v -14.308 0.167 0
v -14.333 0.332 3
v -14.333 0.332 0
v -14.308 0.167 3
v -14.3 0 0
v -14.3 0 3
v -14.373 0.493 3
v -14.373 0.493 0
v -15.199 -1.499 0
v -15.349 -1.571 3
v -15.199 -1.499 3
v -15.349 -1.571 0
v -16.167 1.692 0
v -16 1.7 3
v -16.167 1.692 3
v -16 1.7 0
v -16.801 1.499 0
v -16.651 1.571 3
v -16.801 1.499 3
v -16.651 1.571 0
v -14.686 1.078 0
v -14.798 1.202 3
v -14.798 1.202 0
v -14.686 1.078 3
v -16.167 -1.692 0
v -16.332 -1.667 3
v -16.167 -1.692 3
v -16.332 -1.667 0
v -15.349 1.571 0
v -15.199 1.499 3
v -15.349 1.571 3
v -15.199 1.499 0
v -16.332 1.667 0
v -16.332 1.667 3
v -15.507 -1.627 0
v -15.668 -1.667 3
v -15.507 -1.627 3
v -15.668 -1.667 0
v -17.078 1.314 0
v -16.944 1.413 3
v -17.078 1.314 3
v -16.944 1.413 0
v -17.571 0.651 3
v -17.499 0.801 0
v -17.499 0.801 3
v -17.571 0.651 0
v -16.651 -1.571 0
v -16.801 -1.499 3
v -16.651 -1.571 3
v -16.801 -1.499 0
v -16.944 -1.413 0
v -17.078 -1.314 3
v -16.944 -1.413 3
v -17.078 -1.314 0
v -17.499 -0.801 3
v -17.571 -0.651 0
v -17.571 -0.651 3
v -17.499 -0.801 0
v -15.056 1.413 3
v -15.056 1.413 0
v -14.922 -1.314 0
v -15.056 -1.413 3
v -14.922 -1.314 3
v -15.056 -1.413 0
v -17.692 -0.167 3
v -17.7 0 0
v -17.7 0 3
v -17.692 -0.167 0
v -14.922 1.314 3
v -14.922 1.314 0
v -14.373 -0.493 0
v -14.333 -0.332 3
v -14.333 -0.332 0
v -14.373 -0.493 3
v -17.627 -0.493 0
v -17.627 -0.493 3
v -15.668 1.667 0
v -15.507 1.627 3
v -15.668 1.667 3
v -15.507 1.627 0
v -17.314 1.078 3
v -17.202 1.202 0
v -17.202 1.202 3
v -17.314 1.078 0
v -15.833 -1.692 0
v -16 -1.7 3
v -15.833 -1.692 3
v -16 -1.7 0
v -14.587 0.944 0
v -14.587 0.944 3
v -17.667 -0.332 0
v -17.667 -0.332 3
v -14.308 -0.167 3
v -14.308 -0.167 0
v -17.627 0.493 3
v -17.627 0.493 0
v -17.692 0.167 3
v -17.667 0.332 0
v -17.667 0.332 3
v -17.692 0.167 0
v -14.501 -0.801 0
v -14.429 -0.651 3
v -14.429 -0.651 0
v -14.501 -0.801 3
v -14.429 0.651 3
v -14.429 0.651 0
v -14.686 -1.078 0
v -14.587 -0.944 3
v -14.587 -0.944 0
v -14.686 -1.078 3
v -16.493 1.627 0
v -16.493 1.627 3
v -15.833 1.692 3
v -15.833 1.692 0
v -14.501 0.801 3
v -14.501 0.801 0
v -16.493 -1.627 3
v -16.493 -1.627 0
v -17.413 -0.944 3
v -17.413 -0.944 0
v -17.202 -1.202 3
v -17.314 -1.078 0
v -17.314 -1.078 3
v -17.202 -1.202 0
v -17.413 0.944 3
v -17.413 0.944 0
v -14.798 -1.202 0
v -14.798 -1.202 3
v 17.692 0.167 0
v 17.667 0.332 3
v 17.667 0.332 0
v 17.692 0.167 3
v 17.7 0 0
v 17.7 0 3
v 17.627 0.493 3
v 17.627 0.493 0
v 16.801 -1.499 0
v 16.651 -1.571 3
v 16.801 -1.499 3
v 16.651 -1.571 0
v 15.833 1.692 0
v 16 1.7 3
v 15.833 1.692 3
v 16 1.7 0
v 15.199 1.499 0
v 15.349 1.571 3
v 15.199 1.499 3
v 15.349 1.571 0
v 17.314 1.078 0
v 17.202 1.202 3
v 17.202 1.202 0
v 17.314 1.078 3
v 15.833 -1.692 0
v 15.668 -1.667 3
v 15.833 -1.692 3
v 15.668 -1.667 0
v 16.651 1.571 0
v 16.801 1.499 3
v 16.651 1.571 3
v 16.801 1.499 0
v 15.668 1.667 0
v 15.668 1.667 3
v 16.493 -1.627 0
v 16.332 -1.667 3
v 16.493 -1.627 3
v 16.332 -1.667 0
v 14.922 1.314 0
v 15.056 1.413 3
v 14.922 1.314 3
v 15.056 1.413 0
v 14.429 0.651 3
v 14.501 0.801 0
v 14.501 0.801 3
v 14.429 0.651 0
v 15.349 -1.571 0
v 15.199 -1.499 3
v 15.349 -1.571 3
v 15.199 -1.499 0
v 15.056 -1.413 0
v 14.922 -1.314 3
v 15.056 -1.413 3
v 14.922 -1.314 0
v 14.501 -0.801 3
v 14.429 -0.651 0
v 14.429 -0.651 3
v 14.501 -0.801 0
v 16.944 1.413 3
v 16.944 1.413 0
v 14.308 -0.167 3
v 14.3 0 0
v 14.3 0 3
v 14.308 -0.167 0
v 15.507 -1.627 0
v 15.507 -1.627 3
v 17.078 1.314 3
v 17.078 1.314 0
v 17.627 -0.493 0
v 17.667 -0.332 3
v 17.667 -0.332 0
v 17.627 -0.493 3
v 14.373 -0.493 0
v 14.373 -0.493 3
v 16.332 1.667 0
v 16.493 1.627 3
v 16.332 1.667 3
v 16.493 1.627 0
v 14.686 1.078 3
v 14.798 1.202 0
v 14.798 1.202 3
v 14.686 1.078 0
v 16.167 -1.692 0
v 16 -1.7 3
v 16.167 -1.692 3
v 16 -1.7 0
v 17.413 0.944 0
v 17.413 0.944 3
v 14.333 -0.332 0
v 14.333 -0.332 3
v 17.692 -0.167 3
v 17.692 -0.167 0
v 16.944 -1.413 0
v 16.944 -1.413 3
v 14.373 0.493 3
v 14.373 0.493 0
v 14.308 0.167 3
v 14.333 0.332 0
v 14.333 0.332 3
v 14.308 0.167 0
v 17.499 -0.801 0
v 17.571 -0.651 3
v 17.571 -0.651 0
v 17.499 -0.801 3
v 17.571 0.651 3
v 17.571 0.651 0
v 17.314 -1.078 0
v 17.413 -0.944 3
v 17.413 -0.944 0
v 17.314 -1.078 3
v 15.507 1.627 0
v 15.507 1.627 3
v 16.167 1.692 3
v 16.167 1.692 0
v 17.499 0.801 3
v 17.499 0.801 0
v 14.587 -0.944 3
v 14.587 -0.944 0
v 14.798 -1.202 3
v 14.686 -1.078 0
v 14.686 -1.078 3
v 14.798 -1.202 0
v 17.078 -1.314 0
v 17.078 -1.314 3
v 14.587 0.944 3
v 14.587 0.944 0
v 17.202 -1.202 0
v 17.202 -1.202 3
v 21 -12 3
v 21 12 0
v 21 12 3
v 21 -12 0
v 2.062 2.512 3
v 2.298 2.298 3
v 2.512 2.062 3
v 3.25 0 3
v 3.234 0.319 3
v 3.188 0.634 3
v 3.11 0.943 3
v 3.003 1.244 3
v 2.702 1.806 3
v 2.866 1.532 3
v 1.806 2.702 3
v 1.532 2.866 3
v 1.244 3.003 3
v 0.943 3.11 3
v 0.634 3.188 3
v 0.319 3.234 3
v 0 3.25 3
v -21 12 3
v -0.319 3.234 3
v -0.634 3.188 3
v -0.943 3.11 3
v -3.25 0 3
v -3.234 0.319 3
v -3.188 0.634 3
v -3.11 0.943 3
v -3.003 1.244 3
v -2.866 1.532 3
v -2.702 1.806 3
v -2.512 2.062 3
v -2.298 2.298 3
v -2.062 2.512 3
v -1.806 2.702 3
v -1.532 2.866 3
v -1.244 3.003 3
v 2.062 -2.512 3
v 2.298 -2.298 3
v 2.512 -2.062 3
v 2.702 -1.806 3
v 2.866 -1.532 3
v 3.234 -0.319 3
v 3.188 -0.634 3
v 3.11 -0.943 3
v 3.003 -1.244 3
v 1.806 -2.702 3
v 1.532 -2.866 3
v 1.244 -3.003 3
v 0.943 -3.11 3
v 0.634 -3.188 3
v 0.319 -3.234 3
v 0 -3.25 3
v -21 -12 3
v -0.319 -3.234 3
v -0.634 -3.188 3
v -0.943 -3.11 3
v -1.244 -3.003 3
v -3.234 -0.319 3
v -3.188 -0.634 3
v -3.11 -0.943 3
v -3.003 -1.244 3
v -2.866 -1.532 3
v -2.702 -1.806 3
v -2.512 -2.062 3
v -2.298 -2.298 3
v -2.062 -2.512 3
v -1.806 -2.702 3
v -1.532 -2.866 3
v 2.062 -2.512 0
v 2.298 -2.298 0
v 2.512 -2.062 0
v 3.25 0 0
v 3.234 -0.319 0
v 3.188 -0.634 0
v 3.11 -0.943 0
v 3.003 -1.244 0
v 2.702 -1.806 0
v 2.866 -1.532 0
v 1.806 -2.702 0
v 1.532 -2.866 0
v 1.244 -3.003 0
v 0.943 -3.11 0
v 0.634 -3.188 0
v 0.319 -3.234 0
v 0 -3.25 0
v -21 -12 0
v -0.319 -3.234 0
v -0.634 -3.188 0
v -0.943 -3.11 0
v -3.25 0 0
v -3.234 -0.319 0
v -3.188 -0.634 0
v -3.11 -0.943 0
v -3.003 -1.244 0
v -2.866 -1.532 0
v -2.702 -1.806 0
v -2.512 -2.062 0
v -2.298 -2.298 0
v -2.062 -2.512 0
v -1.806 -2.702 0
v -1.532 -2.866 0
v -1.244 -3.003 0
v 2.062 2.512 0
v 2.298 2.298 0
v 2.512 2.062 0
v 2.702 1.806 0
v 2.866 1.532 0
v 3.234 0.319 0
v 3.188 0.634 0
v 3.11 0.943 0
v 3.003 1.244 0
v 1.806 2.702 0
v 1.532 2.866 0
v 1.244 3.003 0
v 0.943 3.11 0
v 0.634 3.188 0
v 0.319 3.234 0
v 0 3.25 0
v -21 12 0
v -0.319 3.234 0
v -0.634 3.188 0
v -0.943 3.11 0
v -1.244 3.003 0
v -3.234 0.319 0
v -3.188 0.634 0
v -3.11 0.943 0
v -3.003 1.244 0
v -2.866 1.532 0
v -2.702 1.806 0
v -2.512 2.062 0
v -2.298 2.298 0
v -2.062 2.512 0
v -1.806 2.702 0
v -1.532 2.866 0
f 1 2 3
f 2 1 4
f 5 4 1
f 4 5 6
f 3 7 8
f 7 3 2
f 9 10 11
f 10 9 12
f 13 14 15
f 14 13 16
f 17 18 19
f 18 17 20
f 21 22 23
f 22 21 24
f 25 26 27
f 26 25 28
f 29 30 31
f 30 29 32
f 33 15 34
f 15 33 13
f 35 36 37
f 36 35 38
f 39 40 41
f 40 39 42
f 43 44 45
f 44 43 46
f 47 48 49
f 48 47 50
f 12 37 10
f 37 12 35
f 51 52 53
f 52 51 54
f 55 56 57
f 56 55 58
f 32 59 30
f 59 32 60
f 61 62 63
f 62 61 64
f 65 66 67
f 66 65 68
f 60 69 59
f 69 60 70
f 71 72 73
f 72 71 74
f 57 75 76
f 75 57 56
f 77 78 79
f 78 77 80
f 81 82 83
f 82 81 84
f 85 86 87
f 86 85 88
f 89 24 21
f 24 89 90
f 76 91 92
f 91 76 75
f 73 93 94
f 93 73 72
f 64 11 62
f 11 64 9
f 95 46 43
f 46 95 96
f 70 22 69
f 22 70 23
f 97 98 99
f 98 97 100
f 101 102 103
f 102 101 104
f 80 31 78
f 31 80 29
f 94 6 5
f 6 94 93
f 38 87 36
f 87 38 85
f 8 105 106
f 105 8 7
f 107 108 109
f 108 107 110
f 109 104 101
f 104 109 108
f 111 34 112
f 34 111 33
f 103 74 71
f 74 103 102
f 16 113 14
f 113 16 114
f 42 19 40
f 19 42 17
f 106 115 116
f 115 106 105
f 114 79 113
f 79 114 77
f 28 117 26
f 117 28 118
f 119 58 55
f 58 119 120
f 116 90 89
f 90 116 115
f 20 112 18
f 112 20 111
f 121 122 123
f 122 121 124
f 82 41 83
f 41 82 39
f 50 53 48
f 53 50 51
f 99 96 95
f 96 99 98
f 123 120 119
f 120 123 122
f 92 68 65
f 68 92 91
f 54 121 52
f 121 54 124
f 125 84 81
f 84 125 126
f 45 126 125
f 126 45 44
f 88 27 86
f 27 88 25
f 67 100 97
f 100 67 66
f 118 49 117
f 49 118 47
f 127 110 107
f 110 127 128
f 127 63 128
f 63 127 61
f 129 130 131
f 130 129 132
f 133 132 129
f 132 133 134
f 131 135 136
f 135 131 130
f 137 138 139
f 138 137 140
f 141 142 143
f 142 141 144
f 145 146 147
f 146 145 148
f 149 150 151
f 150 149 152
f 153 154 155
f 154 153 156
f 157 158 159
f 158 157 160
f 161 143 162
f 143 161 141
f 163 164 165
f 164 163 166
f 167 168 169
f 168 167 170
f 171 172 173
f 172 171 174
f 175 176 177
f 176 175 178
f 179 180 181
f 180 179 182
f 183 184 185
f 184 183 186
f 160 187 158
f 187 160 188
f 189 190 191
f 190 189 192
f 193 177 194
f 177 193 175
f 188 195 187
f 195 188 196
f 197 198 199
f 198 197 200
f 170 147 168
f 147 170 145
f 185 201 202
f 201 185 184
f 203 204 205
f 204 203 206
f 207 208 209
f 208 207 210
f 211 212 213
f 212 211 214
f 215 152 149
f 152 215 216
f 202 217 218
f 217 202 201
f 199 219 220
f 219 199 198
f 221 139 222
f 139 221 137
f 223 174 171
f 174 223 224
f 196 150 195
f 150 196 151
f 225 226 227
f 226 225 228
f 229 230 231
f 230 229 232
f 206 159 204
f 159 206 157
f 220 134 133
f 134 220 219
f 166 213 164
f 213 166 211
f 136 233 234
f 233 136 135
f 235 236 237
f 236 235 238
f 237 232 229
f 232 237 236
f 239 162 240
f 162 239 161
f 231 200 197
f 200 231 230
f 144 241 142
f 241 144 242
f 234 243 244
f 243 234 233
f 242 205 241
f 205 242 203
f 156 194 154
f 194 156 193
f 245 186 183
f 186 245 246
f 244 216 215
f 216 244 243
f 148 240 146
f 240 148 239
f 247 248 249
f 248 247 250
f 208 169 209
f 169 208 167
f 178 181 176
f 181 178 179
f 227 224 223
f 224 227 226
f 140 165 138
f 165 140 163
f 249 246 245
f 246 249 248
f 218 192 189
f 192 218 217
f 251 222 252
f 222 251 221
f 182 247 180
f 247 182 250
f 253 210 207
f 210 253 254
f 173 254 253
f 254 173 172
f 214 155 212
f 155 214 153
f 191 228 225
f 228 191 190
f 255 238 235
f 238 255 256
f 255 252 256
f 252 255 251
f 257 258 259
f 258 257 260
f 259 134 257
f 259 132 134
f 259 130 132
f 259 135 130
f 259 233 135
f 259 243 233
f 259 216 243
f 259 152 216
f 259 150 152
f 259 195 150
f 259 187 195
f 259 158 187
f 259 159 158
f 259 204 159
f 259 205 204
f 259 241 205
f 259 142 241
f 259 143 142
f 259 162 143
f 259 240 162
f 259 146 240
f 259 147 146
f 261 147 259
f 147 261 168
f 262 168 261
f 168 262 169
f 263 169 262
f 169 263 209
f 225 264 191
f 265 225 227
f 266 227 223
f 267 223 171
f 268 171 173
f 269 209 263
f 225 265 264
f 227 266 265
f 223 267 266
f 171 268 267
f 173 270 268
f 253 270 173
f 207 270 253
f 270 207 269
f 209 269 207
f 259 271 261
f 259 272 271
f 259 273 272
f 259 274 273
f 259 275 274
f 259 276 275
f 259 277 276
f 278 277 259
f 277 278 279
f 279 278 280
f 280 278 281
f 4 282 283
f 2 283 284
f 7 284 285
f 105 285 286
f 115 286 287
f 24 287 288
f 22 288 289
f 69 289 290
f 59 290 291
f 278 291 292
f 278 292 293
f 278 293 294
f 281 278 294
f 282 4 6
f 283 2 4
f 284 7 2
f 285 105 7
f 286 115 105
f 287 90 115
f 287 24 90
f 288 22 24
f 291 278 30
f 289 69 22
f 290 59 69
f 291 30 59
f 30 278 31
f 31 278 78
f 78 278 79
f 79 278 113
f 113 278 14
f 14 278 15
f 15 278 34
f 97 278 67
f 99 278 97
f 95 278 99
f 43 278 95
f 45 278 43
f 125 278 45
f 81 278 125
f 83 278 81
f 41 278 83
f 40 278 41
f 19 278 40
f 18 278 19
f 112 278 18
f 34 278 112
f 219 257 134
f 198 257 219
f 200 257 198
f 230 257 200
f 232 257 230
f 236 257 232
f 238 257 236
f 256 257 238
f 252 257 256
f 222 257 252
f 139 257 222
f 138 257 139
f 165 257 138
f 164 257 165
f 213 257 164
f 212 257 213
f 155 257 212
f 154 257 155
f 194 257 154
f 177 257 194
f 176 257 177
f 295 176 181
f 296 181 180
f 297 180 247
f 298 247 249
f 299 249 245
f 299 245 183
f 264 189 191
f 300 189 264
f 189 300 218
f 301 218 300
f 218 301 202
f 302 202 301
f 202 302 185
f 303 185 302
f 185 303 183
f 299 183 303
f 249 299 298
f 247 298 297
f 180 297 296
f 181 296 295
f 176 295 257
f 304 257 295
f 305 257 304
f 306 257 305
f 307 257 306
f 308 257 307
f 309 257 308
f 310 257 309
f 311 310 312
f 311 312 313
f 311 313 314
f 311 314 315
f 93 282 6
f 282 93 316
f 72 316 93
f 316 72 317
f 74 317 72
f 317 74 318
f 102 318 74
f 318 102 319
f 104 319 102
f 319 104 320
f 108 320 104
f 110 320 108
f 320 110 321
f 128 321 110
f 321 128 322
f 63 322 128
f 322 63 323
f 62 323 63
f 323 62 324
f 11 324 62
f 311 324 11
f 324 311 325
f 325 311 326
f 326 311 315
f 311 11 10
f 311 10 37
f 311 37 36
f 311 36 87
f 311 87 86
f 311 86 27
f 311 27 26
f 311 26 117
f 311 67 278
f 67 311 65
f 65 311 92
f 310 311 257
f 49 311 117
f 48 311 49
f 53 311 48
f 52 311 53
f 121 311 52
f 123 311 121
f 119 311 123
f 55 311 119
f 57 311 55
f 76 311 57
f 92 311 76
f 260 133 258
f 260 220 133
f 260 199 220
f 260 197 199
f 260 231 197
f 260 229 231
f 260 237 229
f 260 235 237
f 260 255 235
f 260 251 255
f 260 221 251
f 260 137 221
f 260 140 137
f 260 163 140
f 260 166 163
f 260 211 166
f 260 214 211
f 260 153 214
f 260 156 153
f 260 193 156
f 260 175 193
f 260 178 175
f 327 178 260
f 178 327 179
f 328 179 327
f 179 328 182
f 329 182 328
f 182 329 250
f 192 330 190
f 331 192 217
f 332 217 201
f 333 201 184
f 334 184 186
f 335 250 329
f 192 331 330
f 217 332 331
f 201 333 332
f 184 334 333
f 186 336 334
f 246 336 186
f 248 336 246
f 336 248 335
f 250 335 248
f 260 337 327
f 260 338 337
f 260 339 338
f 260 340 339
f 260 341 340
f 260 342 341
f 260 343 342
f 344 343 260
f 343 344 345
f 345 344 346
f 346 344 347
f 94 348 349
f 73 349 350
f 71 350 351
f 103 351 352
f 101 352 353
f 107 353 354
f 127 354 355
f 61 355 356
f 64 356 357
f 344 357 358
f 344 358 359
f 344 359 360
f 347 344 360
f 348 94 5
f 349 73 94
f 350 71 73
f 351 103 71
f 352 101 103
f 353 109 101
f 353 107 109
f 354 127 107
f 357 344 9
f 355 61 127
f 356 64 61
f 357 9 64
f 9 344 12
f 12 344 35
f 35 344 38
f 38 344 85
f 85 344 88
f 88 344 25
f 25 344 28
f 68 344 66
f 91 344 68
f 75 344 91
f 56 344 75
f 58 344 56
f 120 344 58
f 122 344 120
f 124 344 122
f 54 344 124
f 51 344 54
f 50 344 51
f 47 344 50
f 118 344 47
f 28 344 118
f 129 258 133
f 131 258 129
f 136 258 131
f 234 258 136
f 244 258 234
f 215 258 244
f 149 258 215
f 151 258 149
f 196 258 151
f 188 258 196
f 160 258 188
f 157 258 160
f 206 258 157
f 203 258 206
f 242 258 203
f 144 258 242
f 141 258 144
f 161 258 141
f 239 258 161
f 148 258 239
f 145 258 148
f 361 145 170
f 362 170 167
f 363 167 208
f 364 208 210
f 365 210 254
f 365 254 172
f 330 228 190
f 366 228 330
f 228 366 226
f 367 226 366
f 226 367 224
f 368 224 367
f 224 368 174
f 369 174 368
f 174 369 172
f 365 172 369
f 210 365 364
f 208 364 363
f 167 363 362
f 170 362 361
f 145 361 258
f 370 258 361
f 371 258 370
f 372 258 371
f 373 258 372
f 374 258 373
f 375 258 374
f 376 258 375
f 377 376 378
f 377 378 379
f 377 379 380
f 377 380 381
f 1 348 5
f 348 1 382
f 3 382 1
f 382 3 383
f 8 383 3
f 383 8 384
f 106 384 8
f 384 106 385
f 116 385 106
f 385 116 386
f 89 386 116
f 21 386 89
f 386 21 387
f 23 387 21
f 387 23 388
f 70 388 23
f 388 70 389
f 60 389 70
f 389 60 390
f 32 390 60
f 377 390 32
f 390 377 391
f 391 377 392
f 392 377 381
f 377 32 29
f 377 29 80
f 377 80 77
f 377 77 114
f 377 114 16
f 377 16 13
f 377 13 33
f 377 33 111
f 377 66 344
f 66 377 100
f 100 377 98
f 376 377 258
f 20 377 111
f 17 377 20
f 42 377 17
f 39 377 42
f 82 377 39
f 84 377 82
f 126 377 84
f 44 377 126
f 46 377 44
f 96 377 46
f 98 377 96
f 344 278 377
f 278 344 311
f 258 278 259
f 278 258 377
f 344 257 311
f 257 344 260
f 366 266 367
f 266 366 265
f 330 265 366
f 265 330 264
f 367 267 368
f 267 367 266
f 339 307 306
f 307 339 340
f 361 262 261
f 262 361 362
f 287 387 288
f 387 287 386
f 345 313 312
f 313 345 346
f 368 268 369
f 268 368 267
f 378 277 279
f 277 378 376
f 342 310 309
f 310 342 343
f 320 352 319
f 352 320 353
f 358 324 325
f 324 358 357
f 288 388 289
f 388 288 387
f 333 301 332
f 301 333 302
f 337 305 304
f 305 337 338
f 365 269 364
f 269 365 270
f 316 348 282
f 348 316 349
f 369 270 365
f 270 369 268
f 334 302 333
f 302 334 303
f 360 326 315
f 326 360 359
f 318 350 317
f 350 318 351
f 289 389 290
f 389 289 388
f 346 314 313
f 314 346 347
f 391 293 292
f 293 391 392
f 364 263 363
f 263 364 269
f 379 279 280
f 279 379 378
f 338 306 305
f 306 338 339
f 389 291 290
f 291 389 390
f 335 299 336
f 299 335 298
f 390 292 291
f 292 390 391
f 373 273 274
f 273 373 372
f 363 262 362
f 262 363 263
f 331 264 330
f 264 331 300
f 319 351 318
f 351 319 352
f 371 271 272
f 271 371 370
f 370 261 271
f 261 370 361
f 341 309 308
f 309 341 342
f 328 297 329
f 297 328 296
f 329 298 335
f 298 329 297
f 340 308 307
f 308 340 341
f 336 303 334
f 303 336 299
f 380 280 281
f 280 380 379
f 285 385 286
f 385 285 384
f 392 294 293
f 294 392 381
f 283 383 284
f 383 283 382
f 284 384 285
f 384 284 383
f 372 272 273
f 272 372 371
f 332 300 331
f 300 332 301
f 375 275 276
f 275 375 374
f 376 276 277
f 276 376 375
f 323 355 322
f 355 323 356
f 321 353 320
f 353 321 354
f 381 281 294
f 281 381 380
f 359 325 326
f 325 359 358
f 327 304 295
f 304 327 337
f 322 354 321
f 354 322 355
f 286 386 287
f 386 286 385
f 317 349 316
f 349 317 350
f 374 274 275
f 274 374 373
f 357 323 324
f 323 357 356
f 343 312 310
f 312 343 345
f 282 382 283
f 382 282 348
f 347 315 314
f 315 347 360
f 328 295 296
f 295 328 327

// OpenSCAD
// Recovered RF-ISO01. Unclad insulating FR4; SMA metal must never bridge to vehicle metal.
$fn=64;
difference(){translate([-21,-12,0])cube([42,24,3]);translate([0,0,-1])cylinder(d=6.5,h=5);for(x=[-16,16])translate([x,0,-1])cylinder(d=3.4,h=5);}
// Vehicle metal:20mmminimum opening around axis, not merely6.5mmSMAhole.
// SMA metalOD<=10mm;axisdisplacement<=0.5mm;M3headOD<=7mm.
